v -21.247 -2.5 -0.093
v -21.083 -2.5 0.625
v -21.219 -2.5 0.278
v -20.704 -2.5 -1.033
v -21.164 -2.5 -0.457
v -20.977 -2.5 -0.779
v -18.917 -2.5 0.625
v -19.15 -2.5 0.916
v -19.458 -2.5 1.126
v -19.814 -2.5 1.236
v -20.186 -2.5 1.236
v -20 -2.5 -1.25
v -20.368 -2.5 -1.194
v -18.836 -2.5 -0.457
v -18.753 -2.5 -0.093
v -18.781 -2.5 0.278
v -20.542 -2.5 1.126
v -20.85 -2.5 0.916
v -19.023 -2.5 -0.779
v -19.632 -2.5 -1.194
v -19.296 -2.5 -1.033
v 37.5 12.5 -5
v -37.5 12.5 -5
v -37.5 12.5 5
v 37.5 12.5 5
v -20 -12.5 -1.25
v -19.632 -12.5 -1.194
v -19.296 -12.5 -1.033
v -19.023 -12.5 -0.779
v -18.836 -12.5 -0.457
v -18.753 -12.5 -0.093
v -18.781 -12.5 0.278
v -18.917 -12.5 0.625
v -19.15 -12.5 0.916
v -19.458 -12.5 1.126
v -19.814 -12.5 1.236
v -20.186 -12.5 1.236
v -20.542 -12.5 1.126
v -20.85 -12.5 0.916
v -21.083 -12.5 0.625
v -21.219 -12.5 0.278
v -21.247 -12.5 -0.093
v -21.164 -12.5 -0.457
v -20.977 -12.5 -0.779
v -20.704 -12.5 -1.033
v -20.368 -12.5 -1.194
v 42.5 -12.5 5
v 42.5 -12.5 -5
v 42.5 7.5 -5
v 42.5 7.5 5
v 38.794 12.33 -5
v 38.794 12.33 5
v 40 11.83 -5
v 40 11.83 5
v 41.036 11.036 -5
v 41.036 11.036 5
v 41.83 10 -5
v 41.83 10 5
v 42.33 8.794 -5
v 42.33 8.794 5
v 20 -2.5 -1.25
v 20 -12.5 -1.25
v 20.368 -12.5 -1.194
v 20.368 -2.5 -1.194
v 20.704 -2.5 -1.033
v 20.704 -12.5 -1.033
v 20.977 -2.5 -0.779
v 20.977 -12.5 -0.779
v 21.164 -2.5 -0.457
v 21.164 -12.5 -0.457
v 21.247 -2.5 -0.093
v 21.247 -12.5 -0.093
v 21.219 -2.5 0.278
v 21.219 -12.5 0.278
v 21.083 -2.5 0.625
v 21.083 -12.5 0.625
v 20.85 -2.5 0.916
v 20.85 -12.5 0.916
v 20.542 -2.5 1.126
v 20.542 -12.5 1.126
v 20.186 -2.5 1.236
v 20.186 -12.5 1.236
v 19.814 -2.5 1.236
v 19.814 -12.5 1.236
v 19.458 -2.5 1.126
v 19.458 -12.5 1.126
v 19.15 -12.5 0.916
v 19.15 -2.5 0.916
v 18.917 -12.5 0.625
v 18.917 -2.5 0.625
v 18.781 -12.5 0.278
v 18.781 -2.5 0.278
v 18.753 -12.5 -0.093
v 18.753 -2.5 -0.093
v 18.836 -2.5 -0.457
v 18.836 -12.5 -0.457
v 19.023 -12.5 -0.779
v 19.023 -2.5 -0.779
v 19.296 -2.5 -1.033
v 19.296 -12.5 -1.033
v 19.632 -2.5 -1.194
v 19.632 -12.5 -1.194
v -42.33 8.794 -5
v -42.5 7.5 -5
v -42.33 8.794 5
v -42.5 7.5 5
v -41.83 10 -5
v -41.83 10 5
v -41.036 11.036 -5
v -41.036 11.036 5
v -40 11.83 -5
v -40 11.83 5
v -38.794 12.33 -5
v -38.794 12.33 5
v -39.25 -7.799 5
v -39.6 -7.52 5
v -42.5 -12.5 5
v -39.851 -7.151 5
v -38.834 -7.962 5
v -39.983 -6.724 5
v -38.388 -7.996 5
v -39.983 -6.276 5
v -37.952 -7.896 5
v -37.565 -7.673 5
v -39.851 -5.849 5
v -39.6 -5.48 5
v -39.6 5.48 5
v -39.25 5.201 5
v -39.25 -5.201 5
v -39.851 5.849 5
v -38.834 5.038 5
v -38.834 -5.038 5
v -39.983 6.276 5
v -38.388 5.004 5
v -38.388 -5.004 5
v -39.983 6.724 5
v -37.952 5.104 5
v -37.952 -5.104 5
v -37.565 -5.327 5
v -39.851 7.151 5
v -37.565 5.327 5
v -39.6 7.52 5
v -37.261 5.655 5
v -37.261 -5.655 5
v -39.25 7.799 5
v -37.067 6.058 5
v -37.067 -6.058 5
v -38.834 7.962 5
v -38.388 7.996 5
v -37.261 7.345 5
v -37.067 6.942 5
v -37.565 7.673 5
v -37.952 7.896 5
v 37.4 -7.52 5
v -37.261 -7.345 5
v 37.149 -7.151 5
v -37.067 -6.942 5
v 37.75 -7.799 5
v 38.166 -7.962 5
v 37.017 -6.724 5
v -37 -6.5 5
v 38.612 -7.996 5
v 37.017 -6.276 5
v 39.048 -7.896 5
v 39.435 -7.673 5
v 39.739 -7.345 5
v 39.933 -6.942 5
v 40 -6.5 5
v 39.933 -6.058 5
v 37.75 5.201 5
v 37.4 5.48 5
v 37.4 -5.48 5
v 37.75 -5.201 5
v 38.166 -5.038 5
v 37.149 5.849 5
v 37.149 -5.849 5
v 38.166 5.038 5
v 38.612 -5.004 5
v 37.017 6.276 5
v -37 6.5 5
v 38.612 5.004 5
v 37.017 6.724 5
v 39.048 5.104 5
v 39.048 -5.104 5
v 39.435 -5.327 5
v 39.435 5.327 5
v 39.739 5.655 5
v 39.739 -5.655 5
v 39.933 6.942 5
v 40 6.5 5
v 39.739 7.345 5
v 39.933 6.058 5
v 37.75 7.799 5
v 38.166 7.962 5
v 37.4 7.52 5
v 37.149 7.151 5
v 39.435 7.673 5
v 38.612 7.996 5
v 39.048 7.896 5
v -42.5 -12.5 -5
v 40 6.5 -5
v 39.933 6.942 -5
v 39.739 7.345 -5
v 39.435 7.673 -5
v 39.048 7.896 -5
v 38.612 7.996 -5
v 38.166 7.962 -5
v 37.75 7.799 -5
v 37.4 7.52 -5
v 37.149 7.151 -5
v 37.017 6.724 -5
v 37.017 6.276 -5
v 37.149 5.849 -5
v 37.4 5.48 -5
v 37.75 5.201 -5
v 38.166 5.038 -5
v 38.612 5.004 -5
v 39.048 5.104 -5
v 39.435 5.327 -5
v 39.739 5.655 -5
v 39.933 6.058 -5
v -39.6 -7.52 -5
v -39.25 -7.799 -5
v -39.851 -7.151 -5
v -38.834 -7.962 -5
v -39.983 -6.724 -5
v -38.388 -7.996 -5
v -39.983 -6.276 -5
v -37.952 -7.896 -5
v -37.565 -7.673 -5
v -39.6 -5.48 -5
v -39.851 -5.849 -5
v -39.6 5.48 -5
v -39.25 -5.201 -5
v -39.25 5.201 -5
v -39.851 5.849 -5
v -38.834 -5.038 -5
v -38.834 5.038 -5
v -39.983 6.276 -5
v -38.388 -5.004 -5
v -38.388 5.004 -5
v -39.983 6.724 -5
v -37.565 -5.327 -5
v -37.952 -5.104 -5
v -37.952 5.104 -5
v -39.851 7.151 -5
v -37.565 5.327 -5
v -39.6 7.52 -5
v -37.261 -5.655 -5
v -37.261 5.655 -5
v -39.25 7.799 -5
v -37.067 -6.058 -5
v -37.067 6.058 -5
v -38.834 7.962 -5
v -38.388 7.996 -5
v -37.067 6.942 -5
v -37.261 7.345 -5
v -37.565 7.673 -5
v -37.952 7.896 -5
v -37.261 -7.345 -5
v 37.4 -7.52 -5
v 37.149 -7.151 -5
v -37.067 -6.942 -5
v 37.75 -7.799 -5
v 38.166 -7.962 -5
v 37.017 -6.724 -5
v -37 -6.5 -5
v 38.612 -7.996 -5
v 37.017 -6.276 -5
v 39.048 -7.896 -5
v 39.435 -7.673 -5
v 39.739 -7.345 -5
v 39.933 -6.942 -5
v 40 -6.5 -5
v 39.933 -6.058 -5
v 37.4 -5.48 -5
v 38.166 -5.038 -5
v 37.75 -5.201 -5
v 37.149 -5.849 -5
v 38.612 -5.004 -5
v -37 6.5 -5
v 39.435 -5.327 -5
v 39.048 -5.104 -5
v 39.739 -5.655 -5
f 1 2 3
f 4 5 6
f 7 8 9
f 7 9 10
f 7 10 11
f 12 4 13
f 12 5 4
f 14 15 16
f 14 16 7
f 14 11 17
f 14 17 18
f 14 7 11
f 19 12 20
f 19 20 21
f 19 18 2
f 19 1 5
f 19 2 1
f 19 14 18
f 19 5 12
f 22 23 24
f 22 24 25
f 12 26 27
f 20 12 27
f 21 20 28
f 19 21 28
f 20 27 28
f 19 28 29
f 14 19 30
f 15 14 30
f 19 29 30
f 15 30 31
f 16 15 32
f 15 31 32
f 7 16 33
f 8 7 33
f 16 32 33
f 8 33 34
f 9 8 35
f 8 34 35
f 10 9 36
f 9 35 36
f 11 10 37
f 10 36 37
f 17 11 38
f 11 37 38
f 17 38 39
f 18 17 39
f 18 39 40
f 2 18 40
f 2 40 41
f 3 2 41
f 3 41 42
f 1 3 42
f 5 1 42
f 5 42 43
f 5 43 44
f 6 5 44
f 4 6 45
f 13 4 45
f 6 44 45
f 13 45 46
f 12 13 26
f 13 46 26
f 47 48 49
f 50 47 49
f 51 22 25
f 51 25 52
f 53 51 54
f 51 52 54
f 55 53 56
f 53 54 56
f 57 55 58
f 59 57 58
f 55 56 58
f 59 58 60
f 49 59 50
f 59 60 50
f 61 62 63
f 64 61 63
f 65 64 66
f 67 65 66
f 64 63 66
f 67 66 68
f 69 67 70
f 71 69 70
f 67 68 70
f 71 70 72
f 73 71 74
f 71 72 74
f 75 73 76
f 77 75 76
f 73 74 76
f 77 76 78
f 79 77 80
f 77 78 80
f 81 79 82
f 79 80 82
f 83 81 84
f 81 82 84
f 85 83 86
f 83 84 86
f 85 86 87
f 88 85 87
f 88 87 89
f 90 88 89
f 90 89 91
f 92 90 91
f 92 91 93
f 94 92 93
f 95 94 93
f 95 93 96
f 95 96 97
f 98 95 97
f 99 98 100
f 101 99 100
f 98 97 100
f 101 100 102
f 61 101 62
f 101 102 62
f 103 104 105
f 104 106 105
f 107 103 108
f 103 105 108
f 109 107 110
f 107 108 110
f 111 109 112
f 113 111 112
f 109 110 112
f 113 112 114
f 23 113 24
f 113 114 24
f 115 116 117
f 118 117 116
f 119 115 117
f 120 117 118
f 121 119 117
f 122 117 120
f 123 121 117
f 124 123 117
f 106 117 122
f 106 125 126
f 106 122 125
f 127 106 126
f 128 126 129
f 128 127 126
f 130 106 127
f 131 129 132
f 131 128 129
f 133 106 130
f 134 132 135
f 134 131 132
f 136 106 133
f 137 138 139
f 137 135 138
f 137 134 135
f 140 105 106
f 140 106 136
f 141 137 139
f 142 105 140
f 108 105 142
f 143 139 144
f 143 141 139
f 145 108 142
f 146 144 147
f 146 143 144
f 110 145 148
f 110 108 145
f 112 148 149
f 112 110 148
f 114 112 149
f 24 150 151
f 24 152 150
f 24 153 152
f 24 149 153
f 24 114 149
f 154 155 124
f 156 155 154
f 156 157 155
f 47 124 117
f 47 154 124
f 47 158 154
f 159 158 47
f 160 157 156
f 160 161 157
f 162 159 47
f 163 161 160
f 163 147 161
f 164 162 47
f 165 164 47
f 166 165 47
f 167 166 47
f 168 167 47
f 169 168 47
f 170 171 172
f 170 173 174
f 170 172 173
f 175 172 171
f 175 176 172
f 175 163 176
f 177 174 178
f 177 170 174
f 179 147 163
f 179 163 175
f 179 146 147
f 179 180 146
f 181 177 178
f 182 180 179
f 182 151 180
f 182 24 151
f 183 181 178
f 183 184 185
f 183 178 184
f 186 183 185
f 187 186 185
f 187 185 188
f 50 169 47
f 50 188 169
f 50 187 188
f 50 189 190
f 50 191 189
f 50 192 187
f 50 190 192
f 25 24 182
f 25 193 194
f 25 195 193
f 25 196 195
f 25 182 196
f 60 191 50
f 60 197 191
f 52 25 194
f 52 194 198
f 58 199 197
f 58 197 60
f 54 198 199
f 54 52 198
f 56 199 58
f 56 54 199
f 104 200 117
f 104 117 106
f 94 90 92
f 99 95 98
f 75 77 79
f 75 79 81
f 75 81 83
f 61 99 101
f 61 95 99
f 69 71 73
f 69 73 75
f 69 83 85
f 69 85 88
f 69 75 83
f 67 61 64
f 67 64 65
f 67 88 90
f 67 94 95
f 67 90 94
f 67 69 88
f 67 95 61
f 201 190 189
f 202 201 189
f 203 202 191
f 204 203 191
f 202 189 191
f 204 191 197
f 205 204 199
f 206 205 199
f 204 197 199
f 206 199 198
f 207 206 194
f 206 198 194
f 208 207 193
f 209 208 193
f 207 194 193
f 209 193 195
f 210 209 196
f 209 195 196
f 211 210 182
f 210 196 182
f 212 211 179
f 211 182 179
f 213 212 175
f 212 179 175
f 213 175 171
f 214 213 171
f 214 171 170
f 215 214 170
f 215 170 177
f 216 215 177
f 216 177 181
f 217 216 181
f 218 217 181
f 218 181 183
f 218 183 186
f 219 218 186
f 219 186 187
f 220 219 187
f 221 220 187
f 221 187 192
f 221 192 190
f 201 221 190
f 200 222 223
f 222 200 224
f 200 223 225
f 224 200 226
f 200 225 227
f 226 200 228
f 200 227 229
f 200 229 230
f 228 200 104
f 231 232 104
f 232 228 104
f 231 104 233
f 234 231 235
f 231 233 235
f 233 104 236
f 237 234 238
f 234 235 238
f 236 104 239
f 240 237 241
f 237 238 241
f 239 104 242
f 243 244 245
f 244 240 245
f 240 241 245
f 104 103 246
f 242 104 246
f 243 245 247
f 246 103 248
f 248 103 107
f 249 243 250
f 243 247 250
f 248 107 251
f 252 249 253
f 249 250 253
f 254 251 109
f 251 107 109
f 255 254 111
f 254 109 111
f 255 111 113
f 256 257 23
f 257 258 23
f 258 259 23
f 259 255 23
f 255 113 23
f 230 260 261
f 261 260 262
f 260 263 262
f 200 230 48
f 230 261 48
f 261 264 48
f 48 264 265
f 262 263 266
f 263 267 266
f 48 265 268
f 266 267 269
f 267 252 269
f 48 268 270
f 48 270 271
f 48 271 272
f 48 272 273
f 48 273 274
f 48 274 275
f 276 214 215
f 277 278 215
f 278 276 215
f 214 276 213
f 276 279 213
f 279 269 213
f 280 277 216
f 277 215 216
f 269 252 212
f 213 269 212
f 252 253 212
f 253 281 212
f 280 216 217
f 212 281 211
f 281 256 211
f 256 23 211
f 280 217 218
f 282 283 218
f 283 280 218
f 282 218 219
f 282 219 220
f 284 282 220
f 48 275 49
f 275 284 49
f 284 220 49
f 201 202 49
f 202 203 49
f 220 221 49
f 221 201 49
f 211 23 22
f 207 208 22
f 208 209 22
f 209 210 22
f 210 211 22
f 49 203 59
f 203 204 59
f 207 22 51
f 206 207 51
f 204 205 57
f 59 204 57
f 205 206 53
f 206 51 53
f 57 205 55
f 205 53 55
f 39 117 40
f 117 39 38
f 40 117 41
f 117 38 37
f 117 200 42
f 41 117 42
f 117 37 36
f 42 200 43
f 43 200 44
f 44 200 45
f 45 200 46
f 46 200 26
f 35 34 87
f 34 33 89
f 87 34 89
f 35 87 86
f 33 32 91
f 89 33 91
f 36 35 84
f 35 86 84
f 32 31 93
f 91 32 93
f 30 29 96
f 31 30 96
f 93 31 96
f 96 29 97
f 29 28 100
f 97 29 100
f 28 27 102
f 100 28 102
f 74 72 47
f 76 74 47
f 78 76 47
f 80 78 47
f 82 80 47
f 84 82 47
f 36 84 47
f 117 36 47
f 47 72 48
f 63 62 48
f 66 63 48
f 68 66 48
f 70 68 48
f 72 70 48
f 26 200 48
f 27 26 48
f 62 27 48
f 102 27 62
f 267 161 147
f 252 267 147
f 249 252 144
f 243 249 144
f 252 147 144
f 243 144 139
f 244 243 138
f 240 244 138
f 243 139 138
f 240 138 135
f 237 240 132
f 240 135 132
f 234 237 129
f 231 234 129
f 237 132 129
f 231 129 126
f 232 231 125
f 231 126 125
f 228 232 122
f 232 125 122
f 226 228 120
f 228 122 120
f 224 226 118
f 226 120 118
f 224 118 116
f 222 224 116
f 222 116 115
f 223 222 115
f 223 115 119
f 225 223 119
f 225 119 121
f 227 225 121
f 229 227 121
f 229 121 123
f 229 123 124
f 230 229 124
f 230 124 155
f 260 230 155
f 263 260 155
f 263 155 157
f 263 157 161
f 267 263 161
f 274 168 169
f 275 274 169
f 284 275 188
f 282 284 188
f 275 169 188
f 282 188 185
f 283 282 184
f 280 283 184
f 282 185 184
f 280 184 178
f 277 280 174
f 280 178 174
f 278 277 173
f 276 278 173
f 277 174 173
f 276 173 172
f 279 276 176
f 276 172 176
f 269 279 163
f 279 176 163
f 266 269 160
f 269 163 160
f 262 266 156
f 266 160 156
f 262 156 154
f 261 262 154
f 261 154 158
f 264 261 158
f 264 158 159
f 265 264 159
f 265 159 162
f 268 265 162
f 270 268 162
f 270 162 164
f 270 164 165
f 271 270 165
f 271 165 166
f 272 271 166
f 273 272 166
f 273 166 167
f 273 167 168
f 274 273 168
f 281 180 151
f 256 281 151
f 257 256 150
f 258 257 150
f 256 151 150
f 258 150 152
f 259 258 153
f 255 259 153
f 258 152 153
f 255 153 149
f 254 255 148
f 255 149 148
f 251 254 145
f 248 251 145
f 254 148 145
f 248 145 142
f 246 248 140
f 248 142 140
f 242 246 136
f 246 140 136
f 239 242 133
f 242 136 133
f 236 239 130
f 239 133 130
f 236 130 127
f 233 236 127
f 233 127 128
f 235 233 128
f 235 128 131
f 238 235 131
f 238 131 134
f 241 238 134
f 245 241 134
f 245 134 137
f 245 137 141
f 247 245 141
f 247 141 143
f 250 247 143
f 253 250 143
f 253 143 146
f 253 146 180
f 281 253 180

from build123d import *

# Parameters (mm, degrees)
EXTRUDE_383_DEPTH      = 5
EXTRUDE_383_DEPTH_BACK = 5
SKETCH_1_W             = 85
SKETCH_1_H             = 25
SKETCH_4_R             = 1.5
CUT_EXTRUDE_595_DEPTH  = 46.414755311
SKETCH_6_R             = 1.25
CUT_EXTRUDE_761_DEPTH  = 10
FILLET_2_R             = 5


with BuildPart() as part:
    # Эскиз1 → Extrude 383 (new, two sides: drawn at the far end of the back side and taken through both)
    with BuildSketch(Plane.XY.offset(-EXTRUDE_383_DEPTH_BACK)):
        Rectangle(SKETCH_1_W, SKETCH_1_H)
    extrude(amount=EXTRUDE_383_DEPTH + EXTRUDE_383_DEPTH_BACK)

    # Эскиз4 → Cut-Extrude 595 (cut, through all)
    with BuildSketch(Plane.XY.offset(5)):
        with Locations((-38.5, 6.5)):
            Circle(SKETCH_4_R)
        with Locations((38.5, 6.5)):
            Circle(SKETCH_4_R)
        with Locations((38.5, -6.5)):
            Circle(SKETCH_4_R)
        with Locations((-38.5, -6.5)):
            Circle(SKETCH_4_R)
    extrude(amount=-CUT_EXTRUDE_595_DEPTH, mode=Mode.SUBTRACT)

    # Эскиз6 → Cut-Extrude 761 (cut)
    with BuildSketch(Plane.XZ.offset(12.5)):
        with Locations((-20, 0)):
            Circle(SKETCH_6_R)
        with Locations((20, 0)):
            Circle(SKETCH_6_R)
    extrude(amount=-CUT_EXTRUDE_761_DEPTH, mode=Mode.SUBTRACT)

    # Скругление2
    fillet_2_edges = [part.edges().sort_by_distance(p)[0] for p in [
        (-42.5, 12.5, 0),
        (42.5, 12.5, 0),
    ]]
    fillet(fillet_2_edges, radius=FILLET_2_R)


solid = part.part
